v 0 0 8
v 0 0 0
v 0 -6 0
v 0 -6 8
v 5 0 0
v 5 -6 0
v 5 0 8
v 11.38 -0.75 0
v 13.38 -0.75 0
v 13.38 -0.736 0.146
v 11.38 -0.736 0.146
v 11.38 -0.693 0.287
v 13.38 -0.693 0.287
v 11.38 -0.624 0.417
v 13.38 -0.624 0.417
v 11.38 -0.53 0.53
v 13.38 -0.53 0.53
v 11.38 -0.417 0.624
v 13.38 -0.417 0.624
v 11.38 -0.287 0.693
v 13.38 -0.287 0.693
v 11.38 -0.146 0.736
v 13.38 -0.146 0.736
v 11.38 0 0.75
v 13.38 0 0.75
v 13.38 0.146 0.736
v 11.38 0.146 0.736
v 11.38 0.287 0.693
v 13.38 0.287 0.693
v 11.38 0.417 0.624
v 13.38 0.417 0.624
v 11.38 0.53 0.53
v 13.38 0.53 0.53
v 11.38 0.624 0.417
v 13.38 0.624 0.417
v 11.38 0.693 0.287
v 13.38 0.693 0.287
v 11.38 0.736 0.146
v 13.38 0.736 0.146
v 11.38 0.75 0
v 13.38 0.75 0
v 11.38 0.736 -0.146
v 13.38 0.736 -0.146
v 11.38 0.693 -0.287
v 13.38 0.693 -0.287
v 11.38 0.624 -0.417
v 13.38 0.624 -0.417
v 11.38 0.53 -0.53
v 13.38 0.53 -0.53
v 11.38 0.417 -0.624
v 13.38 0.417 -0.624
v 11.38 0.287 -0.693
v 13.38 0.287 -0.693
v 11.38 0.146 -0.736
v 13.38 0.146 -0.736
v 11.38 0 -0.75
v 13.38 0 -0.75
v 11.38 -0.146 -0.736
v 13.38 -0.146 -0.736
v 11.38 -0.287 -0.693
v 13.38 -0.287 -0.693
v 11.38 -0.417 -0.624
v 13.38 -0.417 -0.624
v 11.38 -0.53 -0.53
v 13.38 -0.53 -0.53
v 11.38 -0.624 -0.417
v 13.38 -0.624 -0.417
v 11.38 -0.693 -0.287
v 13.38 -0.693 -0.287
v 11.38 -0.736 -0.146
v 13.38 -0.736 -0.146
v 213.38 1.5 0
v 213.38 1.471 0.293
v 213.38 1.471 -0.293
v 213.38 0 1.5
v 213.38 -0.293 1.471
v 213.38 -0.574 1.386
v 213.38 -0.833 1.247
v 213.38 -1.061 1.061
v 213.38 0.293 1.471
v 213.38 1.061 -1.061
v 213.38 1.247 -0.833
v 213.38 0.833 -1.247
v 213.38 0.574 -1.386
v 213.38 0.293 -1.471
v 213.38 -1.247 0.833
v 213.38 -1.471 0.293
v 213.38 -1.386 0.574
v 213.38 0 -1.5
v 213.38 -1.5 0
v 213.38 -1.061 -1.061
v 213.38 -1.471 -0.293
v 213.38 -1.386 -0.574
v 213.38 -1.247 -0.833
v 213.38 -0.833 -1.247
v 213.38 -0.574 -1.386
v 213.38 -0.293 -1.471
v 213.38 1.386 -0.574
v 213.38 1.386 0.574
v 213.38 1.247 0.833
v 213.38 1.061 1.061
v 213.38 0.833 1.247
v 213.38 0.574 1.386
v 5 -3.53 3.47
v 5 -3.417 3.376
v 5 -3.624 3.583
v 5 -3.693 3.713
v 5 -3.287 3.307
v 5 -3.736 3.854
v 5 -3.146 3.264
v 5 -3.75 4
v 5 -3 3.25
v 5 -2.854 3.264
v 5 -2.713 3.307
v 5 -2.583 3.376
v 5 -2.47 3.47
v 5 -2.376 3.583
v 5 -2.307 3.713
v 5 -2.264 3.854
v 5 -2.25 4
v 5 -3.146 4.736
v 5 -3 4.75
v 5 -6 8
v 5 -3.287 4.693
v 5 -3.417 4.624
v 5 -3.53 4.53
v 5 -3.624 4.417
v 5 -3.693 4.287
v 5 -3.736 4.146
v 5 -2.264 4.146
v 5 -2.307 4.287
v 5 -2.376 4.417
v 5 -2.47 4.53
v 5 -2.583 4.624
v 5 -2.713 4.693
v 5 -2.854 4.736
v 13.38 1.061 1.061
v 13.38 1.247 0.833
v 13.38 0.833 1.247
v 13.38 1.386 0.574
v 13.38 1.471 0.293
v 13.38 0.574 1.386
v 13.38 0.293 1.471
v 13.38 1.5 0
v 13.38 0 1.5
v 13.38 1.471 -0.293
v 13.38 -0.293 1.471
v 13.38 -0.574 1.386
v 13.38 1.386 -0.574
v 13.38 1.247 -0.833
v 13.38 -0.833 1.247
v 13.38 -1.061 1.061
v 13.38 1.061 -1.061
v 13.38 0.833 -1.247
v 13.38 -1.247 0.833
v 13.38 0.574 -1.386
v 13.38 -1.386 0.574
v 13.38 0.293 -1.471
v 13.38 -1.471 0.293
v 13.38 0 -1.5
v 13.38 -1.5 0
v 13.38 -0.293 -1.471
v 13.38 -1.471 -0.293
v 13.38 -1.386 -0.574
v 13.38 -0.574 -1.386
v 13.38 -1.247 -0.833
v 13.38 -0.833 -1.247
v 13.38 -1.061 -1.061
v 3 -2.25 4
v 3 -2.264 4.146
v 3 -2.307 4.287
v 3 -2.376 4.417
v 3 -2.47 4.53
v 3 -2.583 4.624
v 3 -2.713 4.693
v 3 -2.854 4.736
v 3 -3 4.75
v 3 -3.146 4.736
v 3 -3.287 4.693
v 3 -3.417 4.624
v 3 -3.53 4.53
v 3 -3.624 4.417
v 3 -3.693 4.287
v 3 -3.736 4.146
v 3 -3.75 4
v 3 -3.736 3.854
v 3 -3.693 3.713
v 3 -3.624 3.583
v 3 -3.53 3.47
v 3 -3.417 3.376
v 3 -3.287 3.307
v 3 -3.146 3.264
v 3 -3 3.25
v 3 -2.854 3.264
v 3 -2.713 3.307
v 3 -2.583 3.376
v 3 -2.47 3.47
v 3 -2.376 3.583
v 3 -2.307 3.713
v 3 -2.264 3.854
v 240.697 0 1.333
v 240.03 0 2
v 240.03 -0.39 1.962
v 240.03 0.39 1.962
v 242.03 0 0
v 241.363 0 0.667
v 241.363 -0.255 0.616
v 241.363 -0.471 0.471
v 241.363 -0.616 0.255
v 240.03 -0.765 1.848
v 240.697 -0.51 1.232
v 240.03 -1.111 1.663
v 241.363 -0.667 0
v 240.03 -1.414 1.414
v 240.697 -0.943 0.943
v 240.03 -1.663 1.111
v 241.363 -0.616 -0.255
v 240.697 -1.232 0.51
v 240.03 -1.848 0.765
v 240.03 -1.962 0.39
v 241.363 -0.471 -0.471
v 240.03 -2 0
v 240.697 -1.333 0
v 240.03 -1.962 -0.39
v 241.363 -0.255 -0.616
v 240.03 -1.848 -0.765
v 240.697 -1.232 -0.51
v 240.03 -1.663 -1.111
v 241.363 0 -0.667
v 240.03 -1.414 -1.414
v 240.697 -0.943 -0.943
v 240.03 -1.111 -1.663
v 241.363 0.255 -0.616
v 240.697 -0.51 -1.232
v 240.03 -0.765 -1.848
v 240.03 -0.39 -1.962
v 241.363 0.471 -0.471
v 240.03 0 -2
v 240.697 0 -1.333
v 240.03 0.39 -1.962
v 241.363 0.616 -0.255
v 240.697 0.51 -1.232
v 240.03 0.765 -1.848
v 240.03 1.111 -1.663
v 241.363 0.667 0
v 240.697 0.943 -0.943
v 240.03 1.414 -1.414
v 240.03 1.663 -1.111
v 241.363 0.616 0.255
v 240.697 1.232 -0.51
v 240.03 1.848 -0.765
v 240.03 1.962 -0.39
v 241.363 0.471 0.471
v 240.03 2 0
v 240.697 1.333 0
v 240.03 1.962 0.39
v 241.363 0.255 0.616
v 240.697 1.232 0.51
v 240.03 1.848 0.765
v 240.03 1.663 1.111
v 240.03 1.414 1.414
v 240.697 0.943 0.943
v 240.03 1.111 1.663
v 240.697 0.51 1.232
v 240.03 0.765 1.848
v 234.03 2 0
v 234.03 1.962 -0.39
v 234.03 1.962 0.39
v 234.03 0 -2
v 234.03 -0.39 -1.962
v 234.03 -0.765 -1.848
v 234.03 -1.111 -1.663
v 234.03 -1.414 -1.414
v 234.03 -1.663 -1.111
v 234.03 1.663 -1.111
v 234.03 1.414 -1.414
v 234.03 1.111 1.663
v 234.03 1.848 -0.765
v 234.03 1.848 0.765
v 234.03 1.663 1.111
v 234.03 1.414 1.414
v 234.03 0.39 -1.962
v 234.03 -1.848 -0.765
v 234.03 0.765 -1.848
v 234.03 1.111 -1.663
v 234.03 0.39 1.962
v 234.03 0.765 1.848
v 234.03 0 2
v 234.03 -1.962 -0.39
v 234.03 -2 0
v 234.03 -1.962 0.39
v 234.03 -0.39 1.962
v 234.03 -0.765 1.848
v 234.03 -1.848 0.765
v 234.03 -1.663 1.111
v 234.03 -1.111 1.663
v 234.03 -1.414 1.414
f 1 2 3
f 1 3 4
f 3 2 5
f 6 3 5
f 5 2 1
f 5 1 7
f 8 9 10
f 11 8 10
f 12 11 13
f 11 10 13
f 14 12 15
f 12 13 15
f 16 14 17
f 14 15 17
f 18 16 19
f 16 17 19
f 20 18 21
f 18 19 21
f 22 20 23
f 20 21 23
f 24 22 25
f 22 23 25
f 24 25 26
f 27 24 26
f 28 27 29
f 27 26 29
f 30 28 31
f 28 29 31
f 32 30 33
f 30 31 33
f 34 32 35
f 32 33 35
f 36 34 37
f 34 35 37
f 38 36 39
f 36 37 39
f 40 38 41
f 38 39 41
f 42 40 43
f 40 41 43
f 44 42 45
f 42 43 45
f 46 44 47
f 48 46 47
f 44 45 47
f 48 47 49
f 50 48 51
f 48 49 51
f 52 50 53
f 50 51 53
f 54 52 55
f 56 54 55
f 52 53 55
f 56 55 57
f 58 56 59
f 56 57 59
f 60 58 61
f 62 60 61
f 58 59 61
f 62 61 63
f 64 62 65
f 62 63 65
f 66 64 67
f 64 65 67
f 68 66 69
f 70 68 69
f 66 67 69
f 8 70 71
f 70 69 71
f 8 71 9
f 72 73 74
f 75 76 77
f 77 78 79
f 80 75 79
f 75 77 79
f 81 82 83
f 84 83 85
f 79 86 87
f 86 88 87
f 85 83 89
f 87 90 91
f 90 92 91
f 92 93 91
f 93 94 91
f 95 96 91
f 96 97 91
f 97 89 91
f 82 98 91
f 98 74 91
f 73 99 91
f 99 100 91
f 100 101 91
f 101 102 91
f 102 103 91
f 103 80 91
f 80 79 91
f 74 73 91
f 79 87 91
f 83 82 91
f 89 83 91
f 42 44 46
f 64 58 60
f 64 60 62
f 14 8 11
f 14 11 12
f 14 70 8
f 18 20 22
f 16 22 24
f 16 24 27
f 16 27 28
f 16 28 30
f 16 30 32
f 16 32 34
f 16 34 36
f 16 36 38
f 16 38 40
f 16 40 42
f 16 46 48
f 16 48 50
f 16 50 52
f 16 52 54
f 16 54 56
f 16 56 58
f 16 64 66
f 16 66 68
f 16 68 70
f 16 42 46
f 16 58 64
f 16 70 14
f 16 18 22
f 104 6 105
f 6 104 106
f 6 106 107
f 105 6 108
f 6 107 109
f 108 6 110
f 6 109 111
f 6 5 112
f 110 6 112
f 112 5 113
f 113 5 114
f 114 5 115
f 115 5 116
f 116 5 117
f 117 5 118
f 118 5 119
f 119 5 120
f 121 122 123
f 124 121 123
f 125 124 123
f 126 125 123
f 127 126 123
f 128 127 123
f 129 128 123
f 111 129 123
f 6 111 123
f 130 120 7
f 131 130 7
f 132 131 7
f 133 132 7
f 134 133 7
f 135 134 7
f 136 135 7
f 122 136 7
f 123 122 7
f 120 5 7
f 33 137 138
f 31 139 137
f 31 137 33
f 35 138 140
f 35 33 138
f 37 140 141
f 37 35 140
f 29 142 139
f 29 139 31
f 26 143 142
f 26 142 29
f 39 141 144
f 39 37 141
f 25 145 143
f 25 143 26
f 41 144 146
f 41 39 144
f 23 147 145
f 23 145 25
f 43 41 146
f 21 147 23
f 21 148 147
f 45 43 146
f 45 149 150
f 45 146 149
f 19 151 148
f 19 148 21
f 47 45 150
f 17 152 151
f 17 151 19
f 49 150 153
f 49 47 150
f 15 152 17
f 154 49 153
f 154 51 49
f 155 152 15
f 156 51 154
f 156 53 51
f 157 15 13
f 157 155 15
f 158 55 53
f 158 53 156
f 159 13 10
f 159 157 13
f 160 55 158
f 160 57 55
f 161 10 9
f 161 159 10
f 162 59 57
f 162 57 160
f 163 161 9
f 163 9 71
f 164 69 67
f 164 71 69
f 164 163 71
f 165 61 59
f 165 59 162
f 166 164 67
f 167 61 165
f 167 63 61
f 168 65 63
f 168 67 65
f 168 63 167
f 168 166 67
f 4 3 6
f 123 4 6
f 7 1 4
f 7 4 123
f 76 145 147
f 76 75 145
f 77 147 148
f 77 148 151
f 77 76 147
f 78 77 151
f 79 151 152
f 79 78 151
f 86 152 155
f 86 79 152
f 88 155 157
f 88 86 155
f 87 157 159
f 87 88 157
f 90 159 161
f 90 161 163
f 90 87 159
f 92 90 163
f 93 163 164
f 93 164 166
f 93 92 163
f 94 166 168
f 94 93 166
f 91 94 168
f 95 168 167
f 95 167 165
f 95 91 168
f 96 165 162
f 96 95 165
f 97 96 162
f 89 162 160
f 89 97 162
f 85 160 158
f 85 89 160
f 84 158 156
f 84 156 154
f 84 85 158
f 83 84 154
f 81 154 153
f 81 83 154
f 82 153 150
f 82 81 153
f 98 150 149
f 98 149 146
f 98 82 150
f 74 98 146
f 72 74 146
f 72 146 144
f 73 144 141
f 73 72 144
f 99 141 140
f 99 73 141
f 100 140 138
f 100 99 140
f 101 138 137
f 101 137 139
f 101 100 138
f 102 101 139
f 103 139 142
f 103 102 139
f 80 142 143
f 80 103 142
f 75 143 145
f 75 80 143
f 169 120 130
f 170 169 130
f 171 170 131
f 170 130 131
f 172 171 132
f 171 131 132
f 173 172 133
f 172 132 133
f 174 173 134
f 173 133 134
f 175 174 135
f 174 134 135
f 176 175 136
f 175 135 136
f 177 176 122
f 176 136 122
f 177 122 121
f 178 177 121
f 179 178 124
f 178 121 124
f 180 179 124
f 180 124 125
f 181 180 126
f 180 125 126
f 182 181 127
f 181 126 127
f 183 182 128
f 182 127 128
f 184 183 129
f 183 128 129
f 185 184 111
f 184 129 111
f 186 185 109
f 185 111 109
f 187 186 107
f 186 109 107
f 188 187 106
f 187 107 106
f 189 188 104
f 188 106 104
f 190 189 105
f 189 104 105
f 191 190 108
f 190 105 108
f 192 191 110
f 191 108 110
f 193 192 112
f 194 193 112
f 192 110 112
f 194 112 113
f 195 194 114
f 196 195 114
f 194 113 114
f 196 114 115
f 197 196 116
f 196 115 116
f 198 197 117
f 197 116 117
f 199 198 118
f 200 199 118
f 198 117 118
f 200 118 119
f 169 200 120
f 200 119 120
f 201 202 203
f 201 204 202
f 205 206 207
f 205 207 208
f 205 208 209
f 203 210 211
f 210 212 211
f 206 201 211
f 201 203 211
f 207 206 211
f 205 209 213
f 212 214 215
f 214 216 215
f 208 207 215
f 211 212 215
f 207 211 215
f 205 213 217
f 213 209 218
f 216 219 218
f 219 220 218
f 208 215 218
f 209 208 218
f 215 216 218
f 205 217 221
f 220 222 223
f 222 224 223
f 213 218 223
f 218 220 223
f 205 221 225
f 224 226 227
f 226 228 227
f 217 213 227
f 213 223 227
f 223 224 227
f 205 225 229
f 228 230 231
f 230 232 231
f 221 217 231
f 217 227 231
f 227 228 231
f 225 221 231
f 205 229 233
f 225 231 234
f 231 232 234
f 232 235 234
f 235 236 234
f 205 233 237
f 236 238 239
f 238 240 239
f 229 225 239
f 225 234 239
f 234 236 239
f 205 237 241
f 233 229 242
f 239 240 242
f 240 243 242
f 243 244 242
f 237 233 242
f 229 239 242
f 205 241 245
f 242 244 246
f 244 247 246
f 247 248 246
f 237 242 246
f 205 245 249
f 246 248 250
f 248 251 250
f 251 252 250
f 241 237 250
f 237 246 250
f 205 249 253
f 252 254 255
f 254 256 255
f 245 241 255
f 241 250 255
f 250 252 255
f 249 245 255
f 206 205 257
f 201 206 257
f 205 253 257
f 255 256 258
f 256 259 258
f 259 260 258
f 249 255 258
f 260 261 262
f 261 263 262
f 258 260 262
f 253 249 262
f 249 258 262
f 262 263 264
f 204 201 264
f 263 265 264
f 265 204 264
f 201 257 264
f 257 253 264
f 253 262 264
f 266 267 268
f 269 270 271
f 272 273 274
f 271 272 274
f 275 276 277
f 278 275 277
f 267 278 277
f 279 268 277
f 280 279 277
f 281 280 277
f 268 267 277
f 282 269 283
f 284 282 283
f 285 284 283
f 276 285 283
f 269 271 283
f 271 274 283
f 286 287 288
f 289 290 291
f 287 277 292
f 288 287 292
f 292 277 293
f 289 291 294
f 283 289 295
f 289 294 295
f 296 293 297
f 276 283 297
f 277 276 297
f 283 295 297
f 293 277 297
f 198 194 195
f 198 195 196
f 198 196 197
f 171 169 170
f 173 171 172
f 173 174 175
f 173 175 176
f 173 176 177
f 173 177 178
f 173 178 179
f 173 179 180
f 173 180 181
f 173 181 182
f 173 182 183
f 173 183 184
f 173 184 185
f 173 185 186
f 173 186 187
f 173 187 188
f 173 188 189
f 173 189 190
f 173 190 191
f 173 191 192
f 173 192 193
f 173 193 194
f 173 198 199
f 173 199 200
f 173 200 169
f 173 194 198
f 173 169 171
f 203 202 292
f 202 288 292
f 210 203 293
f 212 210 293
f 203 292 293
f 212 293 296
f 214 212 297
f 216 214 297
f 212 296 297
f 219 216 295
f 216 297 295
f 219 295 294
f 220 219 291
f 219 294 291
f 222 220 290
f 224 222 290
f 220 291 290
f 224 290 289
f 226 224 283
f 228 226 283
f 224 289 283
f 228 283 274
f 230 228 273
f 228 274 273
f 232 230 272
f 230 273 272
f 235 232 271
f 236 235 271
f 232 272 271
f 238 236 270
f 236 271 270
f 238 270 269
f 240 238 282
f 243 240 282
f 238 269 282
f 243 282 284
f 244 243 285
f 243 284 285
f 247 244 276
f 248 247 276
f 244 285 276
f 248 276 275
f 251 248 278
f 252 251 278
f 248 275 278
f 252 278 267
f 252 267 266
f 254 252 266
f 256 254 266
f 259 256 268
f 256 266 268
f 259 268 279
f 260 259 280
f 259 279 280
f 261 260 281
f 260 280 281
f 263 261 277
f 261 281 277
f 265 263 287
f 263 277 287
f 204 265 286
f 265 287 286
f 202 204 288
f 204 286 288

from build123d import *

# Parameters (mm, degrees)
F0_W     = 5
F0_H     = 8
F1_DEPTH = 6
F2_W     = 200
F2_H     = 1.5
F4_R     = 0.75
F5_DEPTH = 2
F6_R     = 0.75
F7_DEPTH = 2


with BuildPart() as f1:
    # F0 (on Front) → F1 (new body)
    with BuildSketch(Plane.XZ):
        with Locations((2.5, 4)):
            Rectangle(F0_W, F0_H)
    extrude(amount=F1_DEPTH)

    # F6 (on face) → F7 (cut)
    with BuildSketch(Plane.YZ.offset(5)):
        with Locations((-3, 4)):
            Circle(F6_R)
    extrude(amount=-F7_DEPTH, mode=Mode.SUBTRACT)


with BuildPart() as f3:
    # F2 (on Front) → F3 (revolve)
    with BuildSketch(Plane.XZ):
        with Locations((113.379899, 0.75)):
            Rectangle(F2_W, F2_H)
    revolve(axis=Axis((113.379899, 0, 0), (1, 0, 0)))

    # F4 (on face) → F5 (join)
    with BuildSketch(Plane(origin=(13.379899, 0, 0), x_dir=(0, -1, 0), z_dir=(-1, 0, 0))):
        Circle(F4_R)
    extrude(amount=F5_DEPTH)


with BuildPart() as f9:
    # F8 (on Front) → F9 (revolve)
    with BuildSketch(Plane.XZ):
        Polygon((234.029882, 2), (234.029882, 0), (242.029882, 0), (240.029882, 2), align=None)
    revolve(axis=Axis((238.029882, 0, 0), (1, 0, 0)))


solid = Compound([f1.part, f3.part, f9.part])
